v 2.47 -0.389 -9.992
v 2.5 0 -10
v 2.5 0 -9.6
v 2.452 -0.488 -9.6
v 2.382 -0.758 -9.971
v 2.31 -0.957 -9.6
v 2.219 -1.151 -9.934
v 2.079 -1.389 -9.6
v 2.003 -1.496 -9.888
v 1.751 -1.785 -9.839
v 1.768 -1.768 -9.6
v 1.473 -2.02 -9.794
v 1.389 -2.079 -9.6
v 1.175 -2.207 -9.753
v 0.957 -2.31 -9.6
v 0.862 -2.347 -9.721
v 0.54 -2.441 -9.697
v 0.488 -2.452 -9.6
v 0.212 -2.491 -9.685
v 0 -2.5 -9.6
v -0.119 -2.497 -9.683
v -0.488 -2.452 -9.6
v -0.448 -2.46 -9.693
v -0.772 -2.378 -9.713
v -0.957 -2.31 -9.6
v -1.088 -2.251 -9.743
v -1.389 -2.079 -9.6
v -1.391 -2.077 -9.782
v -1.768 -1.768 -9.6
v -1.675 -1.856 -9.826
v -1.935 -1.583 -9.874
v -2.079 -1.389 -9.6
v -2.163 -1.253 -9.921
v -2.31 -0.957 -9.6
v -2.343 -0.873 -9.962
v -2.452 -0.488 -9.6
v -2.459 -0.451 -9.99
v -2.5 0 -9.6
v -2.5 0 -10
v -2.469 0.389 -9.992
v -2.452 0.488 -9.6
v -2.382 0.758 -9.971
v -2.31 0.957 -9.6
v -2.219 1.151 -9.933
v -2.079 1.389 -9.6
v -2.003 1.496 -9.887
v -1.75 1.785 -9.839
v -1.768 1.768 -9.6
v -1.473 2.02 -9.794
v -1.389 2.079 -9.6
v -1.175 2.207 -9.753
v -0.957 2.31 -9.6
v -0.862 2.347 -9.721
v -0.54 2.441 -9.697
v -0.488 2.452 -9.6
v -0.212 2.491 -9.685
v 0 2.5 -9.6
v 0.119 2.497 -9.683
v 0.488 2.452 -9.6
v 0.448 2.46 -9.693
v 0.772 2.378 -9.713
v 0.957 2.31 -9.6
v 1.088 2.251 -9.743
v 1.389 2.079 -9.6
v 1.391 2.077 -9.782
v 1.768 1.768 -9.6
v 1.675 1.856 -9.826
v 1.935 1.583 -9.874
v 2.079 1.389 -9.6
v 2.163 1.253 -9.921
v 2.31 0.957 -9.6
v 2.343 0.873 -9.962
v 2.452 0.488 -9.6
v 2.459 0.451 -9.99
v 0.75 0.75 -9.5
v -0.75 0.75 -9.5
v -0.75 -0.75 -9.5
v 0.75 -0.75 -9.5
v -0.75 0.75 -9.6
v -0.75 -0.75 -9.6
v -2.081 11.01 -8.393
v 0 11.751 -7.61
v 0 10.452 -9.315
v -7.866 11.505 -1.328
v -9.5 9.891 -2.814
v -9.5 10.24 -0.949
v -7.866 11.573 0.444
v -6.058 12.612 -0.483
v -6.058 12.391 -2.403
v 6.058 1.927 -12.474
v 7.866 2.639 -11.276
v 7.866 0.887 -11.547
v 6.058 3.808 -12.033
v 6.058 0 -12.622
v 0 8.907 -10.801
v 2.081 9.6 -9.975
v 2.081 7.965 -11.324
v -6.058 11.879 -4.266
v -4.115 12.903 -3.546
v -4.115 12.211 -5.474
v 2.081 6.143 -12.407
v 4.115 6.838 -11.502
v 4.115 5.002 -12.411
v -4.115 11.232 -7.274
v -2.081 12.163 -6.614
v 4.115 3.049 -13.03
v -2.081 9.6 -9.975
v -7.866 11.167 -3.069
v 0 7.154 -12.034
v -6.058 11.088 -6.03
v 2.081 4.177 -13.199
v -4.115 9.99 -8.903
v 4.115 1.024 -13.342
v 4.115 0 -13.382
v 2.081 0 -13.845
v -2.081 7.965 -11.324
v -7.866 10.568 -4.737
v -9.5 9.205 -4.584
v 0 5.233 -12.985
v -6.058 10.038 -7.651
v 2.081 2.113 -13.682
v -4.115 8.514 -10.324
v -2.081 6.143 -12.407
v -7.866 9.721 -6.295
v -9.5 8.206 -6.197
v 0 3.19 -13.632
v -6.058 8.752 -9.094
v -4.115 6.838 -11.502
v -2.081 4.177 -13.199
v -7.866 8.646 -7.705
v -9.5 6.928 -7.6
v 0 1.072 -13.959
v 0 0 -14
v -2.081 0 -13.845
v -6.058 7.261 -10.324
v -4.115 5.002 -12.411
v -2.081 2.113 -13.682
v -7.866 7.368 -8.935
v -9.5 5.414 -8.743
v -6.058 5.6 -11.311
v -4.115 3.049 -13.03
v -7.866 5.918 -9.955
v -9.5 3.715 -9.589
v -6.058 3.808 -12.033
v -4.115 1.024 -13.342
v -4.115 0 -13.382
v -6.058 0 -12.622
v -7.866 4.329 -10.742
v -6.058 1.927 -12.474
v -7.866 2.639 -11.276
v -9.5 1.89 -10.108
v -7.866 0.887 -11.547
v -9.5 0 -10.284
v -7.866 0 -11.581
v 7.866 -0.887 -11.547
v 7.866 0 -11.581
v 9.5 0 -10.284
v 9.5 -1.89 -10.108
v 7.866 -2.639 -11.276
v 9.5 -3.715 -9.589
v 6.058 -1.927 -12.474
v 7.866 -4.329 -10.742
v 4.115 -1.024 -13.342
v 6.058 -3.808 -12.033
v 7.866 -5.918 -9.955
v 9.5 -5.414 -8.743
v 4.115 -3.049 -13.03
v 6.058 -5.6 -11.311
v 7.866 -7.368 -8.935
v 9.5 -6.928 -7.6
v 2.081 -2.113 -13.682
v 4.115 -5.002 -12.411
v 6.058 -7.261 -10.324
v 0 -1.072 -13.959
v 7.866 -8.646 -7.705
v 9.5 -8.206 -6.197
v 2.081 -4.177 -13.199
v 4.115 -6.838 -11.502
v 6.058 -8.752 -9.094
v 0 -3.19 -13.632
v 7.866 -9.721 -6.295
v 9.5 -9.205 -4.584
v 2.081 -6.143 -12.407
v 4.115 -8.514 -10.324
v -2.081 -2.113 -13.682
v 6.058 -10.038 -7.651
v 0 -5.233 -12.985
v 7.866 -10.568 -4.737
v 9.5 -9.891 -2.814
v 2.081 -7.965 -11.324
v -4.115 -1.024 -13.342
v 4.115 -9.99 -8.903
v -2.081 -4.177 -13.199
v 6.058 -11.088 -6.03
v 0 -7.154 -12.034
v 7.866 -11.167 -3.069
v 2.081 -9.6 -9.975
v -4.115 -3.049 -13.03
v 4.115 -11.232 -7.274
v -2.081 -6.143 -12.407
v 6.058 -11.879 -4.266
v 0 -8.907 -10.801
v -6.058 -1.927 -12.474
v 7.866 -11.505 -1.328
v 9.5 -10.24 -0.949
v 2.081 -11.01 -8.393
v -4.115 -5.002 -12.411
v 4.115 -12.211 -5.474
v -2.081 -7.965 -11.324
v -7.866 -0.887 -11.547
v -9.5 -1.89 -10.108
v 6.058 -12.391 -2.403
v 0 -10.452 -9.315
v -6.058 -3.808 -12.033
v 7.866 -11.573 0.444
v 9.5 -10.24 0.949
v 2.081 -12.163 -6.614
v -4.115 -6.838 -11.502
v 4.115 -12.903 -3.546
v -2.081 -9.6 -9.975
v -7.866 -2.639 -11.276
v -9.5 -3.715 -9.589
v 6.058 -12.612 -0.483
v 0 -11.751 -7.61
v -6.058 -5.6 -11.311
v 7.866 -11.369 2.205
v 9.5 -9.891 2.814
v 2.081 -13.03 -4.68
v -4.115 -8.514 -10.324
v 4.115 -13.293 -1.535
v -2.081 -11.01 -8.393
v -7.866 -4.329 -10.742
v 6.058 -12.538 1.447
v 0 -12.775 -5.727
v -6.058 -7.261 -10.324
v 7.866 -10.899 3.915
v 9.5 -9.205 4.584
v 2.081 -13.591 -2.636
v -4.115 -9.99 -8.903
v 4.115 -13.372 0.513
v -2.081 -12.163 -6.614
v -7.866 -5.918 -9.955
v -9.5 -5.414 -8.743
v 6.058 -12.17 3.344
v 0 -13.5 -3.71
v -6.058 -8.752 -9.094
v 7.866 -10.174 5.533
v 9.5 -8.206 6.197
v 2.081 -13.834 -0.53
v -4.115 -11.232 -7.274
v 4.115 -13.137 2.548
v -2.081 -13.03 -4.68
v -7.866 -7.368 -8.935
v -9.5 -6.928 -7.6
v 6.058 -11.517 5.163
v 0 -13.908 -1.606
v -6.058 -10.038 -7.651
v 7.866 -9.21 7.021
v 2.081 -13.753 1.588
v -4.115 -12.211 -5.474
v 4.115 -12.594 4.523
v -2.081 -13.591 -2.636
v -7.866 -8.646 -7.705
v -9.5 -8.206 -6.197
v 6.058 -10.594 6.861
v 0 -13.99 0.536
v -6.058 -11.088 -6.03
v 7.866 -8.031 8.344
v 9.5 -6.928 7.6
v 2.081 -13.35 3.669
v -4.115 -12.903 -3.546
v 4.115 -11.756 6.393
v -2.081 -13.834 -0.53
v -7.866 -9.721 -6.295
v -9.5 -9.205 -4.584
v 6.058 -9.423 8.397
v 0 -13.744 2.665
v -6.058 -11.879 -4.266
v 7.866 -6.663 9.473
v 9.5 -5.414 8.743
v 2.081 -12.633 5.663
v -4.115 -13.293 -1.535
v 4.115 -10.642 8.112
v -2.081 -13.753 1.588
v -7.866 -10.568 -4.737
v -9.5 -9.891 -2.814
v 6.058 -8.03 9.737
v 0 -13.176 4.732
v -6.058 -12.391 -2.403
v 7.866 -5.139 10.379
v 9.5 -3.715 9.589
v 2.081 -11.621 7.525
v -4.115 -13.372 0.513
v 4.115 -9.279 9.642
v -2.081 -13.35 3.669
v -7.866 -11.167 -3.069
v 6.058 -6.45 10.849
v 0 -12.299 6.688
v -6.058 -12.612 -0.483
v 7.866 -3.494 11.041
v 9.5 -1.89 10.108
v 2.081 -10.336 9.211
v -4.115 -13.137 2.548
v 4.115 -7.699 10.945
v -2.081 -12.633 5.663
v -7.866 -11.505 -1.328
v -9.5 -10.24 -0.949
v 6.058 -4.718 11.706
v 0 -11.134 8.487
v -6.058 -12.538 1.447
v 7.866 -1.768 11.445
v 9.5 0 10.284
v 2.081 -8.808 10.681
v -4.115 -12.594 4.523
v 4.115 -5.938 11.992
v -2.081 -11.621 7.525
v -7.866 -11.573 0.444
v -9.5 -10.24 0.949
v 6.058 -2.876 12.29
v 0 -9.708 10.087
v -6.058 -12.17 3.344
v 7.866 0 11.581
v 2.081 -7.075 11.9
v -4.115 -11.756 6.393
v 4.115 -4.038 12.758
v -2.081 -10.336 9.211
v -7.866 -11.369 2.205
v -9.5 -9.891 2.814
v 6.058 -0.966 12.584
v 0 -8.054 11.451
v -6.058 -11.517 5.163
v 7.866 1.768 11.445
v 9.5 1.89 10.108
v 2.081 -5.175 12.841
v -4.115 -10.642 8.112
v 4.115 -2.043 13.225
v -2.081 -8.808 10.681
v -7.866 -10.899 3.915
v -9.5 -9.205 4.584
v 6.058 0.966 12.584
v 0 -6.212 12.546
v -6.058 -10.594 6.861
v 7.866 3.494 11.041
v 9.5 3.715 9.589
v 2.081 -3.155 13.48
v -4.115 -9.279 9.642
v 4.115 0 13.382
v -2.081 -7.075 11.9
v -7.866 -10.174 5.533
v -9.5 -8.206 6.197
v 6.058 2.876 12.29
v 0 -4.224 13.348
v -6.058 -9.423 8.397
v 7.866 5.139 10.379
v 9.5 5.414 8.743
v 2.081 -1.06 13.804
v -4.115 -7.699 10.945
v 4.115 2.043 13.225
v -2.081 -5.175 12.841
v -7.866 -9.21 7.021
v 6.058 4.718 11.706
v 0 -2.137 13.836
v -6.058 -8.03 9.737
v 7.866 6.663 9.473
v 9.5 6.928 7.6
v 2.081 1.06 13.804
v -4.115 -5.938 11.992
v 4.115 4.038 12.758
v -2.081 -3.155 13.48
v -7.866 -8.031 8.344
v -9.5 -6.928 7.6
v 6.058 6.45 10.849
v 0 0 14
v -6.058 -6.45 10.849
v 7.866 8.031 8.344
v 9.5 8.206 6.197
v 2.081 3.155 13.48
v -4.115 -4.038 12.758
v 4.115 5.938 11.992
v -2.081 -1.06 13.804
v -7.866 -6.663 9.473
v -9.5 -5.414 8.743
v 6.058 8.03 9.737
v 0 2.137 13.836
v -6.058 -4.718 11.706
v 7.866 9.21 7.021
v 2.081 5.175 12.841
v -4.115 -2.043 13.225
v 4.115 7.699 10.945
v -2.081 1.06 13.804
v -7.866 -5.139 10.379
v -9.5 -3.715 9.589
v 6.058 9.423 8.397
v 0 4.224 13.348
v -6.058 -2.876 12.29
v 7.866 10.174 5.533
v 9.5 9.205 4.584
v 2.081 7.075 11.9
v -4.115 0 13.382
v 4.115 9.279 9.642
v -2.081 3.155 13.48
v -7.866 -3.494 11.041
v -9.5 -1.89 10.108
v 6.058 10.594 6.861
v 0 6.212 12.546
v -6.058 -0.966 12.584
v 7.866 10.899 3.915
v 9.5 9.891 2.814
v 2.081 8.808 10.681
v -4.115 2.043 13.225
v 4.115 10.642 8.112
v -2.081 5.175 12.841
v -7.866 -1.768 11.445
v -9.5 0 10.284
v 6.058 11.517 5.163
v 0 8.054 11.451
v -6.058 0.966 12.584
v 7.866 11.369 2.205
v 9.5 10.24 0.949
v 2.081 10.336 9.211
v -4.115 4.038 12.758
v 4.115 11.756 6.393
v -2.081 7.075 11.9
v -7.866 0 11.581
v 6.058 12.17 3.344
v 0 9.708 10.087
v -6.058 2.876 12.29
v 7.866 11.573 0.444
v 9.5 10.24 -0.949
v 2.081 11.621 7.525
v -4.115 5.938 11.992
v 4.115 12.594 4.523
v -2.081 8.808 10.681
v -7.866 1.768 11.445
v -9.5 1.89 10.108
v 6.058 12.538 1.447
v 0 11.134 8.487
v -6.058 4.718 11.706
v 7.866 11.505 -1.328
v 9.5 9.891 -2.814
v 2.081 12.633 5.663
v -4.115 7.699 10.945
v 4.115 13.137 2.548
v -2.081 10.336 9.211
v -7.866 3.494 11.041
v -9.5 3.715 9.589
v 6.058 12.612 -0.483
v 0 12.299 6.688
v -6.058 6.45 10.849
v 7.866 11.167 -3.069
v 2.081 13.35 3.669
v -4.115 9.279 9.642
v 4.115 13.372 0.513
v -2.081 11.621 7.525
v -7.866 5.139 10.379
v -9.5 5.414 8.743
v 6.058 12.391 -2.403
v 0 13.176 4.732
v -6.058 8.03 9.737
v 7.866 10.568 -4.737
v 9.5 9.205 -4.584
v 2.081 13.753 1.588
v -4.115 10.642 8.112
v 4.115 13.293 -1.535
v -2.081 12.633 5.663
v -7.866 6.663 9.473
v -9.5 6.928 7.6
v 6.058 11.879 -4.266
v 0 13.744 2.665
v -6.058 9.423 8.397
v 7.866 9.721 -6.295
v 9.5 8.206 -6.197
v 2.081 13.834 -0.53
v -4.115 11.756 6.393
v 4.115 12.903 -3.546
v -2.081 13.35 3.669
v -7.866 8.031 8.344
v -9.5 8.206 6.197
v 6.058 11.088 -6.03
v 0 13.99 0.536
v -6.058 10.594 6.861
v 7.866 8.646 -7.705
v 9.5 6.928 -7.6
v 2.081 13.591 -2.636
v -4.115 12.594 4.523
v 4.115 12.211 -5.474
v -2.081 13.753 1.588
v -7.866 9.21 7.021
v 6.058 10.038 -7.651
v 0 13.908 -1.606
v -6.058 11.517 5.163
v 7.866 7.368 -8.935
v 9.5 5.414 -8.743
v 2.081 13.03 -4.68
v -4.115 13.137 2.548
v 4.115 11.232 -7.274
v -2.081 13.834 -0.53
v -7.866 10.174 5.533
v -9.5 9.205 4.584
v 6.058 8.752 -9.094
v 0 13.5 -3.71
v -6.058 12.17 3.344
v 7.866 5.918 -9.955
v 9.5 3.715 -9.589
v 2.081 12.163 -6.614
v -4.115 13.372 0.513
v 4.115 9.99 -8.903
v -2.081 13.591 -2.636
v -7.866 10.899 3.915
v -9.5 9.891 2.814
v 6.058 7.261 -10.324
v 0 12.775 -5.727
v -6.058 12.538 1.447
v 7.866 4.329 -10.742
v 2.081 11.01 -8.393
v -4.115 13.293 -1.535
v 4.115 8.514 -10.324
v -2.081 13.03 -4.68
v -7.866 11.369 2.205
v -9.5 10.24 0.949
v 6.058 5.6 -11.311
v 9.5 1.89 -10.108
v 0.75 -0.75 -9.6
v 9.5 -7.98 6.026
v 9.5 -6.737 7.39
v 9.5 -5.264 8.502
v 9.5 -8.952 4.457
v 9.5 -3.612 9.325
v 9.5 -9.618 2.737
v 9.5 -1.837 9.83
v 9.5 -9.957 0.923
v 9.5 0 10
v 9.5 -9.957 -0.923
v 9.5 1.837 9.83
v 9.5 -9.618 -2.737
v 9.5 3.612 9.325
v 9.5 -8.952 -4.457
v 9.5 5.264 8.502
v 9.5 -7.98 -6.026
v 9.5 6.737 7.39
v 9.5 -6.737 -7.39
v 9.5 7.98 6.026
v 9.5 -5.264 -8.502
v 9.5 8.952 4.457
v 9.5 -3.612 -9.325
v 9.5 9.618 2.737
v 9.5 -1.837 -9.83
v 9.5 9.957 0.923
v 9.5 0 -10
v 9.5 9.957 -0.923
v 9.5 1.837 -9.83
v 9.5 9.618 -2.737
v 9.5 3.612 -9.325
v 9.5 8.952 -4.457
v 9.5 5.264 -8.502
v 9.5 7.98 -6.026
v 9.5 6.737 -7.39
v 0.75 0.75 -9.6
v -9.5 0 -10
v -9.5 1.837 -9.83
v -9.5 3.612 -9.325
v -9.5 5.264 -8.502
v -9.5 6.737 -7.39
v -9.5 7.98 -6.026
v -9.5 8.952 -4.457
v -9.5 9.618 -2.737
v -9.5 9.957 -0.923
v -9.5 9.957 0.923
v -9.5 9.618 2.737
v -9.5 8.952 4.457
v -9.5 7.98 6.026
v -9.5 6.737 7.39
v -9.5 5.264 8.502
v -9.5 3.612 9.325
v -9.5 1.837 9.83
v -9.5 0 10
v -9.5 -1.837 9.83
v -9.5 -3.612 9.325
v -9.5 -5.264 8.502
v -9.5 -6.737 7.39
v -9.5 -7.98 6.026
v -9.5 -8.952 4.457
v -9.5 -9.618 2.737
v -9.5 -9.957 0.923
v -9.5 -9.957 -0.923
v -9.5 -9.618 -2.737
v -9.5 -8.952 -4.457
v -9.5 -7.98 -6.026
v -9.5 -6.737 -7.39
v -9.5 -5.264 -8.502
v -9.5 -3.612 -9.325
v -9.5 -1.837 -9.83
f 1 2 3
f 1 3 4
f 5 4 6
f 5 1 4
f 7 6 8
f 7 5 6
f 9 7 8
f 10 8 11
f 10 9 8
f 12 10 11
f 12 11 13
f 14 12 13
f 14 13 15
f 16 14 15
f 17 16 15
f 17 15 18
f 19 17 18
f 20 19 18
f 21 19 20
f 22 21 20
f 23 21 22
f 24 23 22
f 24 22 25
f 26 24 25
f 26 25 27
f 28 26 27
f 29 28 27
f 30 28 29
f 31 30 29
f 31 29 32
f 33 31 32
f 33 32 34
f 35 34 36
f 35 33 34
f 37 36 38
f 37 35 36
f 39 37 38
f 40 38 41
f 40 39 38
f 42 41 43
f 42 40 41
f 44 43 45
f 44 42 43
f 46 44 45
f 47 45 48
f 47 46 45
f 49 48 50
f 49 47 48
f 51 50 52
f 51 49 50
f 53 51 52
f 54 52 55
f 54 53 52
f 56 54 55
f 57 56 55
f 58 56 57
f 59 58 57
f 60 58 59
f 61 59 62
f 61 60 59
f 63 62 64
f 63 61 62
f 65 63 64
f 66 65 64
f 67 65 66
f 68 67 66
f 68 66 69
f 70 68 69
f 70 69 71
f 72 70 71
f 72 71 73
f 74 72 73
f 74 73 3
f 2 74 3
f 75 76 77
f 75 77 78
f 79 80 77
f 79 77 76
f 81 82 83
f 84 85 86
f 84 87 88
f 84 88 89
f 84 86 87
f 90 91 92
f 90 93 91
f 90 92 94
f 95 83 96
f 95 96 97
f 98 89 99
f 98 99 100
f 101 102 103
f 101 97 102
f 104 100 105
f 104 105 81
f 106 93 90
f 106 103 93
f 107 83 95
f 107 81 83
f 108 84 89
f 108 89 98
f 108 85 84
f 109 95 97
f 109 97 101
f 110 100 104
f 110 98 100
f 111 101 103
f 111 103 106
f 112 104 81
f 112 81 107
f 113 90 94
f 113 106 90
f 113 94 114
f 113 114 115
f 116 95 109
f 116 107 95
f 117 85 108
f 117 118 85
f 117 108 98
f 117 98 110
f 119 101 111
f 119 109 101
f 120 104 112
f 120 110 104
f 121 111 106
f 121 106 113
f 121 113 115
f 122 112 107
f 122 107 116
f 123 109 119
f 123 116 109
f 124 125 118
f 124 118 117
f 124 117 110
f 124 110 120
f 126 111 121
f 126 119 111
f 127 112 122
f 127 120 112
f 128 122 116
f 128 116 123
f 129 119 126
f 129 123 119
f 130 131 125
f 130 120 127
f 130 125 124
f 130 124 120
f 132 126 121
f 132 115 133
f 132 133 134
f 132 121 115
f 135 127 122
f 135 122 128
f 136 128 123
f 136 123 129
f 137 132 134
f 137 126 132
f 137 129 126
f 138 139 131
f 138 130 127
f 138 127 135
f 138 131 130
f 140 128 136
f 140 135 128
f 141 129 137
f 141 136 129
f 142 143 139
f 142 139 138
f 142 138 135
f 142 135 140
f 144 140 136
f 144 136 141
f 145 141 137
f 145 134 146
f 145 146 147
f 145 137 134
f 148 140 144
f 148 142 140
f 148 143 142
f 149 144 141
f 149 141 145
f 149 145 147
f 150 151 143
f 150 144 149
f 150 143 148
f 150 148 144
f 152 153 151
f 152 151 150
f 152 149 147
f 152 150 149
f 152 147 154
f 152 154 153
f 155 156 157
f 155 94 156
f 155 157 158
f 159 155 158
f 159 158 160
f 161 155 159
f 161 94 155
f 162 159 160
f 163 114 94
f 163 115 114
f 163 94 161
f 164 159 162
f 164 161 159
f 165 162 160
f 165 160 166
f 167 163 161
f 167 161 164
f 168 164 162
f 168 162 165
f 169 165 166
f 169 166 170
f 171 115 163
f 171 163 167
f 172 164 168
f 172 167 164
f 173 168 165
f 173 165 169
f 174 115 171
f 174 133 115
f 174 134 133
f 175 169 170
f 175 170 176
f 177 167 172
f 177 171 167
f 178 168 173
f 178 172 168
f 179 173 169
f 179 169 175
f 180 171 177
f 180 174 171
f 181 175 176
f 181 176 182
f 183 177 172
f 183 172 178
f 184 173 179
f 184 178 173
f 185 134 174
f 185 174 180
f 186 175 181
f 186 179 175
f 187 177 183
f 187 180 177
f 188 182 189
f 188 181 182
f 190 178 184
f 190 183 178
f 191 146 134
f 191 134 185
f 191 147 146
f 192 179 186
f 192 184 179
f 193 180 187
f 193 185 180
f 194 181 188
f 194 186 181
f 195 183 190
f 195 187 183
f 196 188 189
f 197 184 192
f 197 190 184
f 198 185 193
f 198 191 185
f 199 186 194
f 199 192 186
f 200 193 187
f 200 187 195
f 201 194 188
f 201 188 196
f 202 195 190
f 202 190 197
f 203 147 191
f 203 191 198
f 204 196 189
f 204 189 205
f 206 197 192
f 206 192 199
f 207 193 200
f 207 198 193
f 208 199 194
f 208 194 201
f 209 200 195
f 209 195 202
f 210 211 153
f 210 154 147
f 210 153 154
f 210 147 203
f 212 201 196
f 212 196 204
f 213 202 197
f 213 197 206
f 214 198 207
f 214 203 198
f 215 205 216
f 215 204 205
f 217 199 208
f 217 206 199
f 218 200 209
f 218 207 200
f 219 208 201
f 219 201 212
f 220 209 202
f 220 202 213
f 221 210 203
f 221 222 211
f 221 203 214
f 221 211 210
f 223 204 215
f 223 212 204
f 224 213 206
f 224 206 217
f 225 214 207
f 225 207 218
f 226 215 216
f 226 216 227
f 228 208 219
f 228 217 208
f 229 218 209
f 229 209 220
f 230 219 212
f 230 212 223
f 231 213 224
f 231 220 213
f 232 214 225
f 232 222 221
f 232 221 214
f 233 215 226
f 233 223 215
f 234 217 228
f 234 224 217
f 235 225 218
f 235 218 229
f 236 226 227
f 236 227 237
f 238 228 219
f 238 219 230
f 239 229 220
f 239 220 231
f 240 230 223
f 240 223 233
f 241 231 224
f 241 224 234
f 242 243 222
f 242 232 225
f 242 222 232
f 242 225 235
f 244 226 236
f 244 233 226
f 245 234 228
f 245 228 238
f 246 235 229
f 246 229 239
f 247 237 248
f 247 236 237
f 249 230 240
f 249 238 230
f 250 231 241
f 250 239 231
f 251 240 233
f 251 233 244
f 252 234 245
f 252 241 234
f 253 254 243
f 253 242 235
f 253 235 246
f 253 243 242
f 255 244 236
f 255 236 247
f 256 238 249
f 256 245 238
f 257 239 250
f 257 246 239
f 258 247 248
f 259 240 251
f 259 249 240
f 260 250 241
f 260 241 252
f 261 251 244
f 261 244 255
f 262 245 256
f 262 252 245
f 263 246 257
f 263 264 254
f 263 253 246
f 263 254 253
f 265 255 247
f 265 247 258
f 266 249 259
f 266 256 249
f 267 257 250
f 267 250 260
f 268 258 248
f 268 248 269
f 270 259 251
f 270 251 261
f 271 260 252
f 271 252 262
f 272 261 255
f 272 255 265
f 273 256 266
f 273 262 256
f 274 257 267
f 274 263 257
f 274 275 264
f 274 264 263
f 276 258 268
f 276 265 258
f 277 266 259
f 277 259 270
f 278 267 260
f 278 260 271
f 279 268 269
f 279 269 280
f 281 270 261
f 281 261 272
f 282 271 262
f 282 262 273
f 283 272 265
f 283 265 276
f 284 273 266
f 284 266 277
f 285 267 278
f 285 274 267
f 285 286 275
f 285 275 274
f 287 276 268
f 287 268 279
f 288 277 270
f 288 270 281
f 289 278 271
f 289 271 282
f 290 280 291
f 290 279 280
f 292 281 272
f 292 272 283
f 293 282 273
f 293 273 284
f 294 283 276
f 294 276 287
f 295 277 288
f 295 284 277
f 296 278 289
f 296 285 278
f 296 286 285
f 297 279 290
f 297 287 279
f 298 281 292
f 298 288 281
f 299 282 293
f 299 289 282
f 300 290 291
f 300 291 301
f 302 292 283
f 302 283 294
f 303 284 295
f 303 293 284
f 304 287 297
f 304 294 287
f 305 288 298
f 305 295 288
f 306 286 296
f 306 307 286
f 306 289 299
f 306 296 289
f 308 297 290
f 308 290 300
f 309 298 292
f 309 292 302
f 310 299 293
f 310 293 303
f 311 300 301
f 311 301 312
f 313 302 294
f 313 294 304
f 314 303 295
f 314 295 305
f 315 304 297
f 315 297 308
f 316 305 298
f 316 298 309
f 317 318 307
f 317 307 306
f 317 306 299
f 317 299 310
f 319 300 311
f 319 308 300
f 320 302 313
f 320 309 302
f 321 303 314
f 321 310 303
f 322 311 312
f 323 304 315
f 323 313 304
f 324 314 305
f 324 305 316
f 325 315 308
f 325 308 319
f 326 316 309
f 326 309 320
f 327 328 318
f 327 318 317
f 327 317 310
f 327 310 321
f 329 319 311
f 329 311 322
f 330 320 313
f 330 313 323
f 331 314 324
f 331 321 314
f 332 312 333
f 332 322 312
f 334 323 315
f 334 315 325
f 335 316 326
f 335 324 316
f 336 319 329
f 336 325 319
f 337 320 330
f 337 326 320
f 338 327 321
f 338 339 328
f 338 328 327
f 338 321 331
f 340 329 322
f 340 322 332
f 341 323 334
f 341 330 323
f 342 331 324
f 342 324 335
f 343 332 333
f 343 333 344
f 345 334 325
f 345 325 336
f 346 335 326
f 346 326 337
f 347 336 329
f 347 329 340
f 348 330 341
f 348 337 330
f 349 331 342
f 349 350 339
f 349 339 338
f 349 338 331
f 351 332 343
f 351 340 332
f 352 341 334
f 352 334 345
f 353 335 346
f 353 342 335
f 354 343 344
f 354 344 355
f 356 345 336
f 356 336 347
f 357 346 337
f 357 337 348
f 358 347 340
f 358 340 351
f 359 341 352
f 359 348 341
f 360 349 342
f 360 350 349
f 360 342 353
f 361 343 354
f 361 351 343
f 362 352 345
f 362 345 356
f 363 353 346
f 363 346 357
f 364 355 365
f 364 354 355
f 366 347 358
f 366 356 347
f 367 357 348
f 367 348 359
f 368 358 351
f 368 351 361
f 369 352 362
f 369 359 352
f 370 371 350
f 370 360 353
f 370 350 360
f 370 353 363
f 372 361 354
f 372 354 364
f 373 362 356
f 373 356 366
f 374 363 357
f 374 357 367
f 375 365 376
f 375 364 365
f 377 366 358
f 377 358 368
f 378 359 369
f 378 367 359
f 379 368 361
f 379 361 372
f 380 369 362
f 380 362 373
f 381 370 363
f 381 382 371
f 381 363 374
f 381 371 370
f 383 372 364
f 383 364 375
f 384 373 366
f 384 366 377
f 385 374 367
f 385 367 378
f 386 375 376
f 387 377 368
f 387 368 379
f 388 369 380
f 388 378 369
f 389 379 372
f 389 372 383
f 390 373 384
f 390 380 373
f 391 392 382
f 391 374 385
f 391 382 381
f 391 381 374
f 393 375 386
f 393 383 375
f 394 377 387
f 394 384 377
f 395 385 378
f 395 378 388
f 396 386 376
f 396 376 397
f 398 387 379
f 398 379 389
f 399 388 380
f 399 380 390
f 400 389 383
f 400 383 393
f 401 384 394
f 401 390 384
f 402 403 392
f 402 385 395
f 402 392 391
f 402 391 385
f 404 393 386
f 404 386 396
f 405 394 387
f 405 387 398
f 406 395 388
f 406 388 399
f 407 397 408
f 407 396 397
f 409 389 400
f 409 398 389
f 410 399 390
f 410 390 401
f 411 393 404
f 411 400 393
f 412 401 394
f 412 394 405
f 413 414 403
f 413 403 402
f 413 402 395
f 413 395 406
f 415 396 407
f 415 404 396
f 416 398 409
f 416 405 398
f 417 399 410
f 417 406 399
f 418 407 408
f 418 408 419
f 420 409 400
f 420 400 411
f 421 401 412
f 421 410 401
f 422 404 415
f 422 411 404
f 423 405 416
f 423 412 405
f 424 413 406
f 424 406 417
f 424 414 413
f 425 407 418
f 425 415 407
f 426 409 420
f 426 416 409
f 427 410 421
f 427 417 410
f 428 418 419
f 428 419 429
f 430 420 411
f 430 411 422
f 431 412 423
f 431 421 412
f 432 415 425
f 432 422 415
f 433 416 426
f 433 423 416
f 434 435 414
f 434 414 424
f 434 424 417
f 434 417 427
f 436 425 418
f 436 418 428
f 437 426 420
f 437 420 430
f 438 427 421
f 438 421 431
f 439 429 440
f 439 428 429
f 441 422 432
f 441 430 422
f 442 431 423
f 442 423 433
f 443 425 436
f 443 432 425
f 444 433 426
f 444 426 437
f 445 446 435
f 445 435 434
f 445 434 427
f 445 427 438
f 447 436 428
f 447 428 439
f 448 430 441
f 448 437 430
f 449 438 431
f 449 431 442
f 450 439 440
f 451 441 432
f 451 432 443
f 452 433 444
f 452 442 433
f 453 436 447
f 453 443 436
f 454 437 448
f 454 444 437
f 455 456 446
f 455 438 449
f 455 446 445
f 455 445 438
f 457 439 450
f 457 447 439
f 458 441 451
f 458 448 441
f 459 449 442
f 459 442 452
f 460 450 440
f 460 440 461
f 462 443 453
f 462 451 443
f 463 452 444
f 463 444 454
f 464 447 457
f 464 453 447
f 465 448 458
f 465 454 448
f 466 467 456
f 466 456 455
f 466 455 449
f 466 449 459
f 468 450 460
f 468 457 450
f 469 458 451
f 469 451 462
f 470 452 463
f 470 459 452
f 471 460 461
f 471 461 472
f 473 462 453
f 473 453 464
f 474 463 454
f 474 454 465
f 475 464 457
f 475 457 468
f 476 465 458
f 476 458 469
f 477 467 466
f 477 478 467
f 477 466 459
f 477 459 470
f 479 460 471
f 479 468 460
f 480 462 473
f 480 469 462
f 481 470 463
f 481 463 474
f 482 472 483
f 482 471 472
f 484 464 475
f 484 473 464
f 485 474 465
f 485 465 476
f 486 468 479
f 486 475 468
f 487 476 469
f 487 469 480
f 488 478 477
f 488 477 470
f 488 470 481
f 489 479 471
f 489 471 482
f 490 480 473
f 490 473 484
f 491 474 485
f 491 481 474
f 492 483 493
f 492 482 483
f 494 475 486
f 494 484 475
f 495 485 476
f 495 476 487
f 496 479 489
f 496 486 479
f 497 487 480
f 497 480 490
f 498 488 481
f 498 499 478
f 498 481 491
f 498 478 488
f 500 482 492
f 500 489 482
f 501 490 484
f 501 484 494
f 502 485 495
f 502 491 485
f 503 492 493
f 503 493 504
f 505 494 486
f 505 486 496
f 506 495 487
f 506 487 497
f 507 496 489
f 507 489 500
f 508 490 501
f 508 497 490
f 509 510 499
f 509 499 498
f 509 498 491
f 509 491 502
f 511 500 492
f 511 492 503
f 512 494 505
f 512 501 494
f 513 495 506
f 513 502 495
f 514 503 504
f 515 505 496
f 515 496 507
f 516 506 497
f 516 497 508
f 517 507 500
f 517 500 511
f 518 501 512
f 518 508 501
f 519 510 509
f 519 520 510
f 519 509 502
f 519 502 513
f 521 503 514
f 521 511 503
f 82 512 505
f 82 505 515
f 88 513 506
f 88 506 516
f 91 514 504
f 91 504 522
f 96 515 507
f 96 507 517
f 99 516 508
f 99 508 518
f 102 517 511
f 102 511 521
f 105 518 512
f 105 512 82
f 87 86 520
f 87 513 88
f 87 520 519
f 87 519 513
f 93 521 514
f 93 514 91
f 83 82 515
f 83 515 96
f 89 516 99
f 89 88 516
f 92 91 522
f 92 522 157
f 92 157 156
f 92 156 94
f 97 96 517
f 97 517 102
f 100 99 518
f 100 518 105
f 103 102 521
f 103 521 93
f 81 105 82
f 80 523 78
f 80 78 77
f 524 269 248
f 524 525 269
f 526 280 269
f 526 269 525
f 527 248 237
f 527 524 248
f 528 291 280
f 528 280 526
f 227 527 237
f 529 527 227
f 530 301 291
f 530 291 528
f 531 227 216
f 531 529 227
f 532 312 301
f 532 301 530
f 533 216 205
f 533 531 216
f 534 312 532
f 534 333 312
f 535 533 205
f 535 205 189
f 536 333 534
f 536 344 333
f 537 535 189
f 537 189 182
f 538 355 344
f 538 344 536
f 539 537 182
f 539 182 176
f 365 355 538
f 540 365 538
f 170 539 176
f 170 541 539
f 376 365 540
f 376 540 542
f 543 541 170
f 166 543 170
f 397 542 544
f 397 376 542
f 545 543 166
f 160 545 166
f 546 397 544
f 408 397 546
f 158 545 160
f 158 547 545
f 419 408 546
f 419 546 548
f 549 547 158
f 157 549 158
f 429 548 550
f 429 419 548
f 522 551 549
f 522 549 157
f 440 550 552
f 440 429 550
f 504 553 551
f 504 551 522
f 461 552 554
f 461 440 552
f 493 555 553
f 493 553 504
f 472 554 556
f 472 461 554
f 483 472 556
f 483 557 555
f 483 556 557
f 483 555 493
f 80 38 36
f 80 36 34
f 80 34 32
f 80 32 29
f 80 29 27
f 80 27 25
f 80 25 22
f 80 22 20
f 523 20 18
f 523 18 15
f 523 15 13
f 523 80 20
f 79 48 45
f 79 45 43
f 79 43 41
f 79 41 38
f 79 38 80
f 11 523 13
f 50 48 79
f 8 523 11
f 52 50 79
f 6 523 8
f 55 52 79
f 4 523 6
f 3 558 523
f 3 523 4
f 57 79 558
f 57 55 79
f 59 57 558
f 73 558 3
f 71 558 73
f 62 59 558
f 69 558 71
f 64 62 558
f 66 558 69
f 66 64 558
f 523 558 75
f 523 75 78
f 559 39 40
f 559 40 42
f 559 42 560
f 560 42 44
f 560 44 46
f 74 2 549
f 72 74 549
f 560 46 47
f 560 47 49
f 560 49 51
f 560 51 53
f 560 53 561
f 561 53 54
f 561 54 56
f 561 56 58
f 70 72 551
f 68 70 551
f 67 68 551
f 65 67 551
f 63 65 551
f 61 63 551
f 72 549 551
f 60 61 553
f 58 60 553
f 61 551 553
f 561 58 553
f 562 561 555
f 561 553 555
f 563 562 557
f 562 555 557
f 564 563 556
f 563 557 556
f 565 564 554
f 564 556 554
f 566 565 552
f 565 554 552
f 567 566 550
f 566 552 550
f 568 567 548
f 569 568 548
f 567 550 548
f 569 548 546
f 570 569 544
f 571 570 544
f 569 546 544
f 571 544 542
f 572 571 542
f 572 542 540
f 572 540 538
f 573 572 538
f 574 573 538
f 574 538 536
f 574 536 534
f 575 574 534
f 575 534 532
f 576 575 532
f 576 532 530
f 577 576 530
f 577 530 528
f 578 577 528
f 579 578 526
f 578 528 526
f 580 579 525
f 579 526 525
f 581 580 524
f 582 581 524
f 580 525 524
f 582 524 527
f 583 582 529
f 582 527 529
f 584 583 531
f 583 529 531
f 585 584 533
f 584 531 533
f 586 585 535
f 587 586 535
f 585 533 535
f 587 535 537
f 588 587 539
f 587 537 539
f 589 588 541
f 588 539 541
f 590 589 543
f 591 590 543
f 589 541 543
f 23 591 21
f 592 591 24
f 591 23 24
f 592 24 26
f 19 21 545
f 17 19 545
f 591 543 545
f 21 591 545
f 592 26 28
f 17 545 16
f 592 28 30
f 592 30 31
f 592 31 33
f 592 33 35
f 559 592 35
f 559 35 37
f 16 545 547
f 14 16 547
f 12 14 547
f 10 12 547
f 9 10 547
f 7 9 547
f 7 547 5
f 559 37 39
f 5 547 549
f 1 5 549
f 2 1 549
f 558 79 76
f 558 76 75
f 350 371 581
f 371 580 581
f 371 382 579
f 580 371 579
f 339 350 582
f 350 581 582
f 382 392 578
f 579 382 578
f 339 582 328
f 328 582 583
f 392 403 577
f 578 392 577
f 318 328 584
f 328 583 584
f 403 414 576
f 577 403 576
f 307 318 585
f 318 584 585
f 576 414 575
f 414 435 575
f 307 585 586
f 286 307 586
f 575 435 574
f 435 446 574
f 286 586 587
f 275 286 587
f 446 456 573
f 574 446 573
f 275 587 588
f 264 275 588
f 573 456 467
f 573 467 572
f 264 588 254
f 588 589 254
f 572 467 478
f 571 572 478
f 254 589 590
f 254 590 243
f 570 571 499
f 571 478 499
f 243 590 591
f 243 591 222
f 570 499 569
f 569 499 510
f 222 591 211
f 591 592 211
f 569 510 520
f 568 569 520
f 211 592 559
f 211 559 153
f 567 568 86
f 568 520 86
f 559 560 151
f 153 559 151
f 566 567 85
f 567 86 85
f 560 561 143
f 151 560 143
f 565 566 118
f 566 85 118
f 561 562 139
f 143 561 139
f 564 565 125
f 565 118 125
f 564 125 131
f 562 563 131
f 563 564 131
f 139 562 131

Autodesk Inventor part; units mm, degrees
ref_plane "YZ Plane" through (0, 0, 0) normal (1, 0, 0) x (0, 1, 0)
ref_plane "XZ Plane" through (0, 0, 0) normal (0, 1, 0) x (-1, 0, 0)
sketch "Sketch1" plane through (0, 0, 0) normal (0, 1, 0) x (-1, 0, 0)
  line L0 (9.5, 0) -> (-9.5, 0)
  line L1 (9.5, 0) -> (9.5, -10) construction
  line L2 (-9.5, 0) -> (-9.5, -10) construction
  line L3 (9.5, -10) -> (9.5, -10.2835)
  line L4 (-9.5, -10) -> (-9.5, -10.2835)
  arc A0 (-9.5, -10.2835) -> (9.5, -10.2835) centre (0, 0) ccw
  line L5 (9.5, -10) -> (-9.5, -10)
  dimension "d0" = 19
  dimension "d7" = 14
  dimension "d9" = 10
ref_plane "Work Plane1" through (0, 0, -10) normal (0, 0, 1) x (1, 0, 0)
revolve "Revolution2" add sketch "Sketch1" angle 360 about axis through (-9.5, 0, 0) along (1, 0, 0)
sketch "Sketch4" plane through (0, 0, -10) normal (0, 0, 1) x (1, 0, 0)
  circle A0 centre (0, 0) radius 2.5
  dimension "d17" = 5
extrude "Extrusion3" add sketch "Sketch4" along normal blind 0.4
sketch "Sketch5" plane through (0, 0, -9.6) normal (0, 0, 1) x (1, 0, 0)
  circle A0 centre (0, 0) radius 2.5 projected
  line L0 (0.75, 0.75) -> (0.75, -0.75)
  line L1 (0.75, -0.75) -> (-0.75, -0.75)
  line L2 (-0.75, -0.75) -> (-0.75, 0.75)
  line L3 (-0.75, 0.75) -> (0.75, 0.75)
  point P0 (0.5831, -2.431)
  point P1 (0.5831, 2.431)
  dimension "d20" = 1.5
extrude "Extrusion4" add sketch "Sketch5" along normal blind 0.1 contours L0 L1 L2 L3
properties part number "Smart Ring" material "Titanium"
